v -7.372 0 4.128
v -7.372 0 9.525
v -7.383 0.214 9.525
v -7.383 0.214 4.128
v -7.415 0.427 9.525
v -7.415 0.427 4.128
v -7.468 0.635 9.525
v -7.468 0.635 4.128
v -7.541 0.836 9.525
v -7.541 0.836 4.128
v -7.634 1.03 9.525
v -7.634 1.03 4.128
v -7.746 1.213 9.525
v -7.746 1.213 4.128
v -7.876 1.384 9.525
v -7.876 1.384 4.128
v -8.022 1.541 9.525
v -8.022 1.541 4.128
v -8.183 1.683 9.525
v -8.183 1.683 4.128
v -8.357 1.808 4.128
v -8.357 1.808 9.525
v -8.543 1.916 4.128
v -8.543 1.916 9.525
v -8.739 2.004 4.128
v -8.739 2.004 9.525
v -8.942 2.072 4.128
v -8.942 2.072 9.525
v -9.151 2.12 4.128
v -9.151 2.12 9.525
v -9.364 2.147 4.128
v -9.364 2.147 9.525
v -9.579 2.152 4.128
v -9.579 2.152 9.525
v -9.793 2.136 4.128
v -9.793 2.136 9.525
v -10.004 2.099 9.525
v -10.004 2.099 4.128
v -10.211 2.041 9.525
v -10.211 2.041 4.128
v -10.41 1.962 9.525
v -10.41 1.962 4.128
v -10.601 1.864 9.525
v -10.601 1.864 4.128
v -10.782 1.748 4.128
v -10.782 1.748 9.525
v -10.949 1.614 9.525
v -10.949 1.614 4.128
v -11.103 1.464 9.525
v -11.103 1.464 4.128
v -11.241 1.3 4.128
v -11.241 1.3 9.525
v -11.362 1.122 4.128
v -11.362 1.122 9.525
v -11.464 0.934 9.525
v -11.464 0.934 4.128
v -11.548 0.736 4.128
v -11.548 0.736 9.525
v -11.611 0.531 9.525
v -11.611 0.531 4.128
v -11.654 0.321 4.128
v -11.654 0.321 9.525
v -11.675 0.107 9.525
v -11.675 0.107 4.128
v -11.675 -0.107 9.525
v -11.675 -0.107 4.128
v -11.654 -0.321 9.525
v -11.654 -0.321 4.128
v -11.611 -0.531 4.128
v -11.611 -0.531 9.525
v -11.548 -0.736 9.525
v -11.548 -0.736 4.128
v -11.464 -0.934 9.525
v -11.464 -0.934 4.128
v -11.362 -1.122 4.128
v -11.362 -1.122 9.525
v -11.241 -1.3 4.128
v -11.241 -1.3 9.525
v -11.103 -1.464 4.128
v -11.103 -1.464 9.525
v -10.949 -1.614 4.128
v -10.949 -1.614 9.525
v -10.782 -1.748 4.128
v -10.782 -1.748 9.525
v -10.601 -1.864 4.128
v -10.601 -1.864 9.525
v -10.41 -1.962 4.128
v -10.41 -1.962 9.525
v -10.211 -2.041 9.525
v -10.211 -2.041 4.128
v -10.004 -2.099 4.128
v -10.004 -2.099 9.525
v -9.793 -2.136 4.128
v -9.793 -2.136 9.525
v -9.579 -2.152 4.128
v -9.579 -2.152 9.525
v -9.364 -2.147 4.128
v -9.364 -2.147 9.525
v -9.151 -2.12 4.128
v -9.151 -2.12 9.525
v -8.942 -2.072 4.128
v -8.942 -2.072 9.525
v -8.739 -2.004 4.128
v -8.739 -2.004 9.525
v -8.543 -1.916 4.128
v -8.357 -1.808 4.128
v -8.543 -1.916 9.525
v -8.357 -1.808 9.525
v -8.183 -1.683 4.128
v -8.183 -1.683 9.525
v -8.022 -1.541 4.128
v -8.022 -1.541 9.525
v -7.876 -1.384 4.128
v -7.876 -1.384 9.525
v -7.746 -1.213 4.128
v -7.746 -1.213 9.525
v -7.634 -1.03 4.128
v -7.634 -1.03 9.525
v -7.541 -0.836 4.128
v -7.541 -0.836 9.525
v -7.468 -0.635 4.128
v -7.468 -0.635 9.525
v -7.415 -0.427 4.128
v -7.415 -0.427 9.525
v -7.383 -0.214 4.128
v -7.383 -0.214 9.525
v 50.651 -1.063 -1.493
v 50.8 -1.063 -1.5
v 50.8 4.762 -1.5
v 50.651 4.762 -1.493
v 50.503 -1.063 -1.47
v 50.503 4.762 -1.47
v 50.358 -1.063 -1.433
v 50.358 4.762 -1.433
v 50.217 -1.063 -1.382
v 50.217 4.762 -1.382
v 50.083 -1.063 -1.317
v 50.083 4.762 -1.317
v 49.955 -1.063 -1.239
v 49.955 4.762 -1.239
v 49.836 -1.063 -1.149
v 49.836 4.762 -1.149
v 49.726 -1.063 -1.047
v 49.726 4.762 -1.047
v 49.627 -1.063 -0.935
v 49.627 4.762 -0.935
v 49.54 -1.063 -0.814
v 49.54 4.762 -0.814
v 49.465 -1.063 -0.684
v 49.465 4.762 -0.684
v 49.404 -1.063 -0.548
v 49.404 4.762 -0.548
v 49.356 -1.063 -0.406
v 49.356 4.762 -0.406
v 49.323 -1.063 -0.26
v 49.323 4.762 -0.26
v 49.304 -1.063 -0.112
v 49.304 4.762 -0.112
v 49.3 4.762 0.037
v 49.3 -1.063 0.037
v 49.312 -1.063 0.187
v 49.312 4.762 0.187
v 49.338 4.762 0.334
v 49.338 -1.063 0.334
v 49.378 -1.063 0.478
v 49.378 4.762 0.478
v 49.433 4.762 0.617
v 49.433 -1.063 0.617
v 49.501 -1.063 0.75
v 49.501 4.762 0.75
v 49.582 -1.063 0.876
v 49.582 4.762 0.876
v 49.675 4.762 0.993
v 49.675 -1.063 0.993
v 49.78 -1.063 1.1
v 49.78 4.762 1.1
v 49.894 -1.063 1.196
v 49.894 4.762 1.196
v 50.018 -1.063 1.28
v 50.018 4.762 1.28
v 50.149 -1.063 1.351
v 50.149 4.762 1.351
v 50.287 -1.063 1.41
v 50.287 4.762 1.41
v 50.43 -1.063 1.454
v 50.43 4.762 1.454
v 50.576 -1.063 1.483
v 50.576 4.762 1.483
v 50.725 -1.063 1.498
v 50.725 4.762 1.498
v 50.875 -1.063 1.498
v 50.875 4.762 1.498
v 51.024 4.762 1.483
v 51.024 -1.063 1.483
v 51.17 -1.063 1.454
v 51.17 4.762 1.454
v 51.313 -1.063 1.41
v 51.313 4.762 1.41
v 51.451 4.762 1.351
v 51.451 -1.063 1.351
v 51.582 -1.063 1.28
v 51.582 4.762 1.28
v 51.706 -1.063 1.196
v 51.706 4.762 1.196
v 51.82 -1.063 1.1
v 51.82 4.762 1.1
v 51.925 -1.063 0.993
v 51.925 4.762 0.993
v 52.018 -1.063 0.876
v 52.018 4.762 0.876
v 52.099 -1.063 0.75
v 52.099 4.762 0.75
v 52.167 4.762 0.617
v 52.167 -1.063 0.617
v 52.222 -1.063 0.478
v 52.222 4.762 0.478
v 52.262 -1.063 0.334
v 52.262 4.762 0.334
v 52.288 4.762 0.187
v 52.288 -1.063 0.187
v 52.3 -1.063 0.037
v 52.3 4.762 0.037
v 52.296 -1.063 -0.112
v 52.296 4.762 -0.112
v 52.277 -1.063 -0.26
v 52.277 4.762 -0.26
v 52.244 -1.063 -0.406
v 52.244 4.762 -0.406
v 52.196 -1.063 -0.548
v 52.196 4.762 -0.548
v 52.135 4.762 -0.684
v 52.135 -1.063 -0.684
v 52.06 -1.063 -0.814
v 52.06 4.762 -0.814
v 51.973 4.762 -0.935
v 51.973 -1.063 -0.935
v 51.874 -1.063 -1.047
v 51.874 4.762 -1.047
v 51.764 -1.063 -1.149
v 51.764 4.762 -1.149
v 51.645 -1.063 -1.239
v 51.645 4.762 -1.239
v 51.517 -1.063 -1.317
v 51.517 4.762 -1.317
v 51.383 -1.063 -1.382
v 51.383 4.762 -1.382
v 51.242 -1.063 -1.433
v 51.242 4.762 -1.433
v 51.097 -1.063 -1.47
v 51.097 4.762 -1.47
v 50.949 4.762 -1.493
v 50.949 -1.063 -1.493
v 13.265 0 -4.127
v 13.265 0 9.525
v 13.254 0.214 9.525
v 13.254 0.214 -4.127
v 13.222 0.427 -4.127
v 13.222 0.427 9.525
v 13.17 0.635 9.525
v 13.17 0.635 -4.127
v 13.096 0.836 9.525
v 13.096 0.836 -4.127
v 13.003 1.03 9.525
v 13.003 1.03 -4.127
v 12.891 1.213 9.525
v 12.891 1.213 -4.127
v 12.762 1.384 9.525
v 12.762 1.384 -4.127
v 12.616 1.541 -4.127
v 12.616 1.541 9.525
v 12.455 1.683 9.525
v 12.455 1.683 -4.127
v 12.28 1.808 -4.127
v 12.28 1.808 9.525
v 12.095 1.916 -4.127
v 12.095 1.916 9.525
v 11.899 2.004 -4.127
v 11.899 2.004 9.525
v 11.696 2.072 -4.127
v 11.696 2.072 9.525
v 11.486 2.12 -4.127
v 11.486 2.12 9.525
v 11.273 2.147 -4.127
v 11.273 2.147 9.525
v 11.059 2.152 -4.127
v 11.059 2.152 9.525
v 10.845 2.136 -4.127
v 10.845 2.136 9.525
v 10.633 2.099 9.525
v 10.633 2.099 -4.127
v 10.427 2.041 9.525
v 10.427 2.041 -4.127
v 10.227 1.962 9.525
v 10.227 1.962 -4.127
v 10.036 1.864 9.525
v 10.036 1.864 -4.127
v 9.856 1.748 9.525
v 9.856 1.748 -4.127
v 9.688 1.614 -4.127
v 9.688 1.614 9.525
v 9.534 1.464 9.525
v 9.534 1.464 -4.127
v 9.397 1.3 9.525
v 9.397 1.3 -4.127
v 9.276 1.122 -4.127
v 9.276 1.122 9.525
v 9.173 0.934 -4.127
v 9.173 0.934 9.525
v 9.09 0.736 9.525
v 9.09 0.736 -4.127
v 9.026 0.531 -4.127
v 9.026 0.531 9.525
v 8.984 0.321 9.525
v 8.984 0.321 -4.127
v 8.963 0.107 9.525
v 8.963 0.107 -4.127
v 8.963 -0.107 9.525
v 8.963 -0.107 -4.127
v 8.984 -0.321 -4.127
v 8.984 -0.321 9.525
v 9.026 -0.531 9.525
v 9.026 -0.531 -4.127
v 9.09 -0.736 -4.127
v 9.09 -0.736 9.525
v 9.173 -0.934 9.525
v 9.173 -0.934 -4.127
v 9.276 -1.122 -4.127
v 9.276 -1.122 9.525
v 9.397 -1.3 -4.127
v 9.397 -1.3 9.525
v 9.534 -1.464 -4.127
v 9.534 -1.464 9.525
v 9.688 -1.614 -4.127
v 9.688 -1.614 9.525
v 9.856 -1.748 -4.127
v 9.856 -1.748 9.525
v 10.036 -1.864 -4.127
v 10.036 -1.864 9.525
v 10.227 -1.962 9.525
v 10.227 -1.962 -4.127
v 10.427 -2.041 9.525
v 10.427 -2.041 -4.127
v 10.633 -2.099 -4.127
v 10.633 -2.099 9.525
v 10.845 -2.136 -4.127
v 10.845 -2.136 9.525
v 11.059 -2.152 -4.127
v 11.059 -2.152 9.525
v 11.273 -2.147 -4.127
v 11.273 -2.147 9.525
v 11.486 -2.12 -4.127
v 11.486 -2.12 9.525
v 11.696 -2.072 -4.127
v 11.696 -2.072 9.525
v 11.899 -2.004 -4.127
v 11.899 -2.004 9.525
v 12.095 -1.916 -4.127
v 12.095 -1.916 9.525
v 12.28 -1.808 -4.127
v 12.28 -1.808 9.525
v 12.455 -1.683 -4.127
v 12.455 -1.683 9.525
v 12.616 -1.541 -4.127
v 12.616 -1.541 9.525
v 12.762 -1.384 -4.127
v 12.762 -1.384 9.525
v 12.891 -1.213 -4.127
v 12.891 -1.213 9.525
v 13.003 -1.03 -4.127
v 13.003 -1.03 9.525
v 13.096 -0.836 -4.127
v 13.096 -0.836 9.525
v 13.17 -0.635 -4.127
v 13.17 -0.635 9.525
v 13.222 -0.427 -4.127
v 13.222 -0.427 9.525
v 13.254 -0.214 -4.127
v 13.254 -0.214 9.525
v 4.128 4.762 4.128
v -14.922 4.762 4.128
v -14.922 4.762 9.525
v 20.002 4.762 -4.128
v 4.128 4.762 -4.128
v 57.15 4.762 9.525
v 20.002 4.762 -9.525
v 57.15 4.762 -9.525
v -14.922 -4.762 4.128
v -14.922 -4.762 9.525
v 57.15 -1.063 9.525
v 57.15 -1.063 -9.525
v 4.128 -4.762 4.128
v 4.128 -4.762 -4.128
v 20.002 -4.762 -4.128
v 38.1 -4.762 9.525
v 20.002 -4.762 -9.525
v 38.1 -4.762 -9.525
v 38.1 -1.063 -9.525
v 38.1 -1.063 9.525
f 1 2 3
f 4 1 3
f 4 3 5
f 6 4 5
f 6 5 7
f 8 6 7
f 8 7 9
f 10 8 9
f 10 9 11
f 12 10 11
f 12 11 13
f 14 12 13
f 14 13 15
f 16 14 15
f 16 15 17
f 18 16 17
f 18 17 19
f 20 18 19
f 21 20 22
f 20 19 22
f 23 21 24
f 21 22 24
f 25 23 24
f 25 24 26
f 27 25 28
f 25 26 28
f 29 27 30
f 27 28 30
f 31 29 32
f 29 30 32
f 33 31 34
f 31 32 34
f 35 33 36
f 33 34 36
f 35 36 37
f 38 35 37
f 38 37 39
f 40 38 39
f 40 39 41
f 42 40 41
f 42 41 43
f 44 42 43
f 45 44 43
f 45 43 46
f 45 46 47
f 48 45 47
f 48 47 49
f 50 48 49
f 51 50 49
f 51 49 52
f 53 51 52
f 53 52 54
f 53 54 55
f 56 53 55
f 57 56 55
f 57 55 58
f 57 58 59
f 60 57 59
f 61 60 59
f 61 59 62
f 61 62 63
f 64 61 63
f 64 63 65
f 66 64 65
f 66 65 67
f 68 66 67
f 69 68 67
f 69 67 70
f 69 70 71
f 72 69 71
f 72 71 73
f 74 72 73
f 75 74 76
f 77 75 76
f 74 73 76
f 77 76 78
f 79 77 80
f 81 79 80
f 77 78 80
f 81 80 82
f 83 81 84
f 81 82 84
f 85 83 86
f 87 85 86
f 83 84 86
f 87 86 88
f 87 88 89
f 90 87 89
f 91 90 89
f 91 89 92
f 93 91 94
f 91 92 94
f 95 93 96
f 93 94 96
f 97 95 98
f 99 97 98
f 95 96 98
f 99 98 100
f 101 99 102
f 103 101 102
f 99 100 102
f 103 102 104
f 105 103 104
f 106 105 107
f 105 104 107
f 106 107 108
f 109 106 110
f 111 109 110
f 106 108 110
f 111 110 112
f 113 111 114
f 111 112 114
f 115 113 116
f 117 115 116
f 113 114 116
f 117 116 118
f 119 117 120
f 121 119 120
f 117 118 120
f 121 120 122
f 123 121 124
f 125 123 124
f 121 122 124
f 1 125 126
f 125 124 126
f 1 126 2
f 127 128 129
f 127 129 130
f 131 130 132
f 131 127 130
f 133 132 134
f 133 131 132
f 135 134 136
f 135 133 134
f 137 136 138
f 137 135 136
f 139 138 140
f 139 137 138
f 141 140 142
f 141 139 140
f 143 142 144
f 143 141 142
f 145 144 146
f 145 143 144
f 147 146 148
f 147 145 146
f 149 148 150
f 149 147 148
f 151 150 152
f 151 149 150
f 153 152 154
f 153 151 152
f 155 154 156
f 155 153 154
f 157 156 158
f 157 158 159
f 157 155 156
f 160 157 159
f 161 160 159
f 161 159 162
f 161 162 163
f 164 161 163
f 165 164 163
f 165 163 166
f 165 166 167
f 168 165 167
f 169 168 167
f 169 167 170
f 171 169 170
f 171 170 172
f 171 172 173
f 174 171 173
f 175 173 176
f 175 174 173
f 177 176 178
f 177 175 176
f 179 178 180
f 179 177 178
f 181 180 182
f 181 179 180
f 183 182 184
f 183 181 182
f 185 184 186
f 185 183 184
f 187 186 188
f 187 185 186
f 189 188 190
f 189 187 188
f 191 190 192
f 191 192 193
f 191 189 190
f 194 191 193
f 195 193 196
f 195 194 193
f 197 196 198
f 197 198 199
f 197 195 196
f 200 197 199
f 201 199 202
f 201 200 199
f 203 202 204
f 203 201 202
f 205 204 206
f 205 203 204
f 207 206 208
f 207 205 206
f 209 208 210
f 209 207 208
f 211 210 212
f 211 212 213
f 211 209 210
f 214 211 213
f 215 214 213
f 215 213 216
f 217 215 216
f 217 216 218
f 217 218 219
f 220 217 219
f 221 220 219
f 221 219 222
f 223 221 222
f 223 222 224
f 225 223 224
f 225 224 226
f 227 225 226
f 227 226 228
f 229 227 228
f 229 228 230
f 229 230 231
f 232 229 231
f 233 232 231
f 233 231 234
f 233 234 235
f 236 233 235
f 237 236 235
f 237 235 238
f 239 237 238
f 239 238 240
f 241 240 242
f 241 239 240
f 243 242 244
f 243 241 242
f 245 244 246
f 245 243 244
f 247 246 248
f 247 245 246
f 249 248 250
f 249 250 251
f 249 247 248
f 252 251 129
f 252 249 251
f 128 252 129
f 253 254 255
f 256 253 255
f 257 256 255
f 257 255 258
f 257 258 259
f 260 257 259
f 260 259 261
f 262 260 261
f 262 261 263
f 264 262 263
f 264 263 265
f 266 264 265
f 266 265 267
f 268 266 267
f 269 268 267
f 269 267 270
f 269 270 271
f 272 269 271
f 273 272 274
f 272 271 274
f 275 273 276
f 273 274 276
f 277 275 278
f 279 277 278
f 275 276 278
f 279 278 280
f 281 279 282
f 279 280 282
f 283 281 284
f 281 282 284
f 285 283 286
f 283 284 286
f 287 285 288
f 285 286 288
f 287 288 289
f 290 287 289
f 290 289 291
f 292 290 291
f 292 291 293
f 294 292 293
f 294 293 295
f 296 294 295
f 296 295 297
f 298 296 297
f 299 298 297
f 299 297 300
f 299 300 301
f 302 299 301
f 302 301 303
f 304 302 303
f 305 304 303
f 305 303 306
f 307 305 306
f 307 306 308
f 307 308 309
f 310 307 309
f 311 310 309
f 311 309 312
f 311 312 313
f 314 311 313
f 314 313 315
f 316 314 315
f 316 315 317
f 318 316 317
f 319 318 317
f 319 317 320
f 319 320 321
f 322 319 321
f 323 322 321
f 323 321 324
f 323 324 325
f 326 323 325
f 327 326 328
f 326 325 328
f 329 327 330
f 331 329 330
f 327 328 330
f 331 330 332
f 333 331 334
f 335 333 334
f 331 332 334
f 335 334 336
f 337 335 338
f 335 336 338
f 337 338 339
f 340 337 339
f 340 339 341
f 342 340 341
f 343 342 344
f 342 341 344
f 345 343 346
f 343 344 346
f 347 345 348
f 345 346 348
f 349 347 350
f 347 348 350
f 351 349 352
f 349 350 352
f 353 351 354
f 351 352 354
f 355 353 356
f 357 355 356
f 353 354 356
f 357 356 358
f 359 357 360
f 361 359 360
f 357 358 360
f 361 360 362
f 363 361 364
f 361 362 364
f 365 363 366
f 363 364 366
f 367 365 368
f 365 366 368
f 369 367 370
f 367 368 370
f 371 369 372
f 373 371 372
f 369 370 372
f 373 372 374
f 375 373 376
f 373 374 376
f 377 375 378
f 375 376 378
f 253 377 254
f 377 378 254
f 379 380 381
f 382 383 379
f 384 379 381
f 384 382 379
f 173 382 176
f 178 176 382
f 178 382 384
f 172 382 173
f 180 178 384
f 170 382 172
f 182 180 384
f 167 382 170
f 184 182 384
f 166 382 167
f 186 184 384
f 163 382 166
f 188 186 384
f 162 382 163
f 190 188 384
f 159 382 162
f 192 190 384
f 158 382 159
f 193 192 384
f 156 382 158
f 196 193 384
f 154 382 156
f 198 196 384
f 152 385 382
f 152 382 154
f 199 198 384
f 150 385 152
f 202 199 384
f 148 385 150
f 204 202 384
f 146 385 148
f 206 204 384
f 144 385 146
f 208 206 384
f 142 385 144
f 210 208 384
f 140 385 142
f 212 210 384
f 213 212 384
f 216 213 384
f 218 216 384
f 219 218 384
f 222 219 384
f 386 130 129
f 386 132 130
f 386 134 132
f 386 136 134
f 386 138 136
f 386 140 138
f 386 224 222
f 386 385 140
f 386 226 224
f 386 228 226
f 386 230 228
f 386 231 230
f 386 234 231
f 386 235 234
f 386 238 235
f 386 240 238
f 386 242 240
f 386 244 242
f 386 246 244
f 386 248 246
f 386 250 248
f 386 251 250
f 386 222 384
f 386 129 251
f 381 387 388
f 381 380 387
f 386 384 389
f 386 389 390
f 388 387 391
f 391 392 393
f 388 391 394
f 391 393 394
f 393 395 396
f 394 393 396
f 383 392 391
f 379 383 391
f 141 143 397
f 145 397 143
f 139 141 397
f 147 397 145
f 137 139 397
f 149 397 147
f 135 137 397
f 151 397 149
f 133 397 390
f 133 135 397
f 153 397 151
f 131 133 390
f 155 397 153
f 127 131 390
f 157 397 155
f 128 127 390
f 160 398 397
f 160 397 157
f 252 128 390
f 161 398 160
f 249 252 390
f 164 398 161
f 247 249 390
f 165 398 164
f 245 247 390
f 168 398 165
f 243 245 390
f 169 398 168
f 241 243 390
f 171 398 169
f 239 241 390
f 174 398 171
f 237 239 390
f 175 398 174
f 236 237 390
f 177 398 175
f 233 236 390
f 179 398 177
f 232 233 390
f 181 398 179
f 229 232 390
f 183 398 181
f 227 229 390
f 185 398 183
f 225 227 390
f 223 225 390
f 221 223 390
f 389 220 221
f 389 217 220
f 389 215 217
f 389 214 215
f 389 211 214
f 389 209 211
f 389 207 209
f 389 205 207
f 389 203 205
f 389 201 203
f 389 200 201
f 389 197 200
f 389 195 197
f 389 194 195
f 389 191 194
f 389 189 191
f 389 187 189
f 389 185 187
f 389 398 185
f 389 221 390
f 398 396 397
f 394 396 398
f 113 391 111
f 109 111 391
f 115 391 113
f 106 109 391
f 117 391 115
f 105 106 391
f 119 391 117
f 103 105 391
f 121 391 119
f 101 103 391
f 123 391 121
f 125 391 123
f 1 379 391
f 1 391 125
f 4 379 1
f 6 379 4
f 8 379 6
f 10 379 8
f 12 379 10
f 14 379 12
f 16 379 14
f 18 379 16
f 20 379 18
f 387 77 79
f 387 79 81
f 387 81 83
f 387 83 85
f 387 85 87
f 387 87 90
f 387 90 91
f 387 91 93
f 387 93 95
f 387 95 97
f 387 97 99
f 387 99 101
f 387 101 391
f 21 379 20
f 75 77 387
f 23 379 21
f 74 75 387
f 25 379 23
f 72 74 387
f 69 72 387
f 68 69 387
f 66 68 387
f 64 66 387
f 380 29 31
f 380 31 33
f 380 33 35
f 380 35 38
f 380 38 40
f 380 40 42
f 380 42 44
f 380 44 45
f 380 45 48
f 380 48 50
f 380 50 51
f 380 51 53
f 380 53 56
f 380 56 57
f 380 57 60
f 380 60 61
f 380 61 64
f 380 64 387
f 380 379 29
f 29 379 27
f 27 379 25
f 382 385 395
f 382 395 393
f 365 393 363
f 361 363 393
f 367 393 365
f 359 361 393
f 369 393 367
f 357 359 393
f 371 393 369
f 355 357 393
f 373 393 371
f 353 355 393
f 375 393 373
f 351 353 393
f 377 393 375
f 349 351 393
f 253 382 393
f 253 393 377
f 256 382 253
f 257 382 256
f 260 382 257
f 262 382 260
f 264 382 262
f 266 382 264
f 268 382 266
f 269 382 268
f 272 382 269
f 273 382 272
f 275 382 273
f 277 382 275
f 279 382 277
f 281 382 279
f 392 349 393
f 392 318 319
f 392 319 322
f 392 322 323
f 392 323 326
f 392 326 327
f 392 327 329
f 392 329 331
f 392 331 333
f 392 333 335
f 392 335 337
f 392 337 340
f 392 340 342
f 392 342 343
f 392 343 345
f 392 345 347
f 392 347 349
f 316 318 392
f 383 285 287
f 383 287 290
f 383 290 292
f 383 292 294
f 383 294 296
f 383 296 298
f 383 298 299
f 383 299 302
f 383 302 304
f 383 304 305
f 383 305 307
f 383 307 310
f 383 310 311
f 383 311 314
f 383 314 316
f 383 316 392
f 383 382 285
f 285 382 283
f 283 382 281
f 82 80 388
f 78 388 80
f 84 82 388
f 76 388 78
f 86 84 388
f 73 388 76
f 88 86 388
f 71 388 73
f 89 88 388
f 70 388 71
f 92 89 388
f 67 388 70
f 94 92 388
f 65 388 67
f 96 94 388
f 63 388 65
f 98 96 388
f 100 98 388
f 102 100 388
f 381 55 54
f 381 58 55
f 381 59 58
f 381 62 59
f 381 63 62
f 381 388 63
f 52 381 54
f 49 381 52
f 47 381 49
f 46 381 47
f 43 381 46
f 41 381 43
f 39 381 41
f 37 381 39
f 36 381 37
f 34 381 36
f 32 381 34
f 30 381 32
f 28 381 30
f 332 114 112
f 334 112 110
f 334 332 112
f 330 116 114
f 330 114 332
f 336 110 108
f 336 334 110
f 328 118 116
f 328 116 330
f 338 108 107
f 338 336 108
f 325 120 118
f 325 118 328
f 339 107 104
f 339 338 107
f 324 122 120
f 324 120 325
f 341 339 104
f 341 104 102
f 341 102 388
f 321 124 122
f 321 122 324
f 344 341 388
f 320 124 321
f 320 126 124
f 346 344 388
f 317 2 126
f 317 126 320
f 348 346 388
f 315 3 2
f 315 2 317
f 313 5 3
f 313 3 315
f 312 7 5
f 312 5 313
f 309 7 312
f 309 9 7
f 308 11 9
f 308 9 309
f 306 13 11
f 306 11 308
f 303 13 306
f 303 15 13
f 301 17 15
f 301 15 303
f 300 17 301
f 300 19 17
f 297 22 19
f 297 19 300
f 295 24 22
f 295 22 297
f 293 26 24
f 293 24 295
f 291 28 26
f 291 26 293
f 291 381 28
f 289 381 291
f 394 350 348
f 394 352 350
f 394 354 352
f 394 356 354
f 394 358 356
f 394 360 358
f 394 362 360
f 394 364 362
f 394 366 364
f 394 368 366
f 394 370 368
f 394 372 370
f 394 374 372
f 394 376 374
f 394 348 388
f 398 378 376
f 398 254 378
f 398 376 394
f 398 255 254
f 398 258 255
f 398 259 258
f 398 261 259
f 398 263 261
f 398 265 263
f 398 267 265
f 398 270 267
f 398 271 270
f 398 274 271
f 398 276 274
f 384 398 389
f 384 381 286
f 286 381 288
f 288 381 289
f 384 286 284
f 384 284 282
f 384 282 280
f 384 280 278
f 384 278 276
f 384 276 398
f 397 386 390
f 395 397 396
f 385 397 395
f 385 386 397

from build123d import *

# Parameters (mm, degrees)
SKETCH1_R           = 1.5
BOSS_EXTRUDE1_DEPTH = 4.7625
SKETCH2_R           = 2.15265
CUT_EXTRUDE1_DEPTH  = 61.429350536
SKETCH3_W           = 19.05
SKETCH3_H           = 19.05
CUT_EXTRUDE2_DEPTH  = 3.699999966


with BuildPart() as part:
    # Sketch1 → Boss-Extrude1 (new, symmetric)
    with BuildSketch(Plane(origin=(0, 0, 0), x_dir=(1, 0, 0), z_dir=(0, 1, 0))):
        Polygon((-14.9225, -4.1275), (-14.9225, -9.525), (57.15, -9.525), (57.15, 9.525), (20.0025, 9.525), (20.0025, 4.1275), (4.1275, 4.1275), (4.1275, -4.1275), align=None)
        with Locations(Location((50.8, 0, 0), (0, 0, 90))):
            Circle(SKETCH1_R, mode=Mode.SUBTRACT)
    extrude(amount=BOSS_EXTRUDE1_DEPTH, both=True)

    # Sketch2 → Cut-Extrude1 (cut, through all)
    with BuildSketch(Plane.XY.offset(9.525)):
        with Locations((-9.525, 0)):
            Circle(SKETCH2_R)
        with Locations((11.1125, 0)):
            Circle(SKETCH2_R)
    extrude(amount=-CUT_EXTRUDE1_DEPTH, mode=Mode.SUBTRACT)

    # Sketch3 → Cut-Extrude2 (cut)
    with BuildSketch(Plane.XZ.offset(4.7625)):
        with Locations((47.625, 0)):
            Rectangle(SKETCH3_W, SKETCH3_H)
    extrude(amount=-CUT_EXTRUDE2_DEPTH, mode=Mode.SUBTRACT)


solid = part.part
